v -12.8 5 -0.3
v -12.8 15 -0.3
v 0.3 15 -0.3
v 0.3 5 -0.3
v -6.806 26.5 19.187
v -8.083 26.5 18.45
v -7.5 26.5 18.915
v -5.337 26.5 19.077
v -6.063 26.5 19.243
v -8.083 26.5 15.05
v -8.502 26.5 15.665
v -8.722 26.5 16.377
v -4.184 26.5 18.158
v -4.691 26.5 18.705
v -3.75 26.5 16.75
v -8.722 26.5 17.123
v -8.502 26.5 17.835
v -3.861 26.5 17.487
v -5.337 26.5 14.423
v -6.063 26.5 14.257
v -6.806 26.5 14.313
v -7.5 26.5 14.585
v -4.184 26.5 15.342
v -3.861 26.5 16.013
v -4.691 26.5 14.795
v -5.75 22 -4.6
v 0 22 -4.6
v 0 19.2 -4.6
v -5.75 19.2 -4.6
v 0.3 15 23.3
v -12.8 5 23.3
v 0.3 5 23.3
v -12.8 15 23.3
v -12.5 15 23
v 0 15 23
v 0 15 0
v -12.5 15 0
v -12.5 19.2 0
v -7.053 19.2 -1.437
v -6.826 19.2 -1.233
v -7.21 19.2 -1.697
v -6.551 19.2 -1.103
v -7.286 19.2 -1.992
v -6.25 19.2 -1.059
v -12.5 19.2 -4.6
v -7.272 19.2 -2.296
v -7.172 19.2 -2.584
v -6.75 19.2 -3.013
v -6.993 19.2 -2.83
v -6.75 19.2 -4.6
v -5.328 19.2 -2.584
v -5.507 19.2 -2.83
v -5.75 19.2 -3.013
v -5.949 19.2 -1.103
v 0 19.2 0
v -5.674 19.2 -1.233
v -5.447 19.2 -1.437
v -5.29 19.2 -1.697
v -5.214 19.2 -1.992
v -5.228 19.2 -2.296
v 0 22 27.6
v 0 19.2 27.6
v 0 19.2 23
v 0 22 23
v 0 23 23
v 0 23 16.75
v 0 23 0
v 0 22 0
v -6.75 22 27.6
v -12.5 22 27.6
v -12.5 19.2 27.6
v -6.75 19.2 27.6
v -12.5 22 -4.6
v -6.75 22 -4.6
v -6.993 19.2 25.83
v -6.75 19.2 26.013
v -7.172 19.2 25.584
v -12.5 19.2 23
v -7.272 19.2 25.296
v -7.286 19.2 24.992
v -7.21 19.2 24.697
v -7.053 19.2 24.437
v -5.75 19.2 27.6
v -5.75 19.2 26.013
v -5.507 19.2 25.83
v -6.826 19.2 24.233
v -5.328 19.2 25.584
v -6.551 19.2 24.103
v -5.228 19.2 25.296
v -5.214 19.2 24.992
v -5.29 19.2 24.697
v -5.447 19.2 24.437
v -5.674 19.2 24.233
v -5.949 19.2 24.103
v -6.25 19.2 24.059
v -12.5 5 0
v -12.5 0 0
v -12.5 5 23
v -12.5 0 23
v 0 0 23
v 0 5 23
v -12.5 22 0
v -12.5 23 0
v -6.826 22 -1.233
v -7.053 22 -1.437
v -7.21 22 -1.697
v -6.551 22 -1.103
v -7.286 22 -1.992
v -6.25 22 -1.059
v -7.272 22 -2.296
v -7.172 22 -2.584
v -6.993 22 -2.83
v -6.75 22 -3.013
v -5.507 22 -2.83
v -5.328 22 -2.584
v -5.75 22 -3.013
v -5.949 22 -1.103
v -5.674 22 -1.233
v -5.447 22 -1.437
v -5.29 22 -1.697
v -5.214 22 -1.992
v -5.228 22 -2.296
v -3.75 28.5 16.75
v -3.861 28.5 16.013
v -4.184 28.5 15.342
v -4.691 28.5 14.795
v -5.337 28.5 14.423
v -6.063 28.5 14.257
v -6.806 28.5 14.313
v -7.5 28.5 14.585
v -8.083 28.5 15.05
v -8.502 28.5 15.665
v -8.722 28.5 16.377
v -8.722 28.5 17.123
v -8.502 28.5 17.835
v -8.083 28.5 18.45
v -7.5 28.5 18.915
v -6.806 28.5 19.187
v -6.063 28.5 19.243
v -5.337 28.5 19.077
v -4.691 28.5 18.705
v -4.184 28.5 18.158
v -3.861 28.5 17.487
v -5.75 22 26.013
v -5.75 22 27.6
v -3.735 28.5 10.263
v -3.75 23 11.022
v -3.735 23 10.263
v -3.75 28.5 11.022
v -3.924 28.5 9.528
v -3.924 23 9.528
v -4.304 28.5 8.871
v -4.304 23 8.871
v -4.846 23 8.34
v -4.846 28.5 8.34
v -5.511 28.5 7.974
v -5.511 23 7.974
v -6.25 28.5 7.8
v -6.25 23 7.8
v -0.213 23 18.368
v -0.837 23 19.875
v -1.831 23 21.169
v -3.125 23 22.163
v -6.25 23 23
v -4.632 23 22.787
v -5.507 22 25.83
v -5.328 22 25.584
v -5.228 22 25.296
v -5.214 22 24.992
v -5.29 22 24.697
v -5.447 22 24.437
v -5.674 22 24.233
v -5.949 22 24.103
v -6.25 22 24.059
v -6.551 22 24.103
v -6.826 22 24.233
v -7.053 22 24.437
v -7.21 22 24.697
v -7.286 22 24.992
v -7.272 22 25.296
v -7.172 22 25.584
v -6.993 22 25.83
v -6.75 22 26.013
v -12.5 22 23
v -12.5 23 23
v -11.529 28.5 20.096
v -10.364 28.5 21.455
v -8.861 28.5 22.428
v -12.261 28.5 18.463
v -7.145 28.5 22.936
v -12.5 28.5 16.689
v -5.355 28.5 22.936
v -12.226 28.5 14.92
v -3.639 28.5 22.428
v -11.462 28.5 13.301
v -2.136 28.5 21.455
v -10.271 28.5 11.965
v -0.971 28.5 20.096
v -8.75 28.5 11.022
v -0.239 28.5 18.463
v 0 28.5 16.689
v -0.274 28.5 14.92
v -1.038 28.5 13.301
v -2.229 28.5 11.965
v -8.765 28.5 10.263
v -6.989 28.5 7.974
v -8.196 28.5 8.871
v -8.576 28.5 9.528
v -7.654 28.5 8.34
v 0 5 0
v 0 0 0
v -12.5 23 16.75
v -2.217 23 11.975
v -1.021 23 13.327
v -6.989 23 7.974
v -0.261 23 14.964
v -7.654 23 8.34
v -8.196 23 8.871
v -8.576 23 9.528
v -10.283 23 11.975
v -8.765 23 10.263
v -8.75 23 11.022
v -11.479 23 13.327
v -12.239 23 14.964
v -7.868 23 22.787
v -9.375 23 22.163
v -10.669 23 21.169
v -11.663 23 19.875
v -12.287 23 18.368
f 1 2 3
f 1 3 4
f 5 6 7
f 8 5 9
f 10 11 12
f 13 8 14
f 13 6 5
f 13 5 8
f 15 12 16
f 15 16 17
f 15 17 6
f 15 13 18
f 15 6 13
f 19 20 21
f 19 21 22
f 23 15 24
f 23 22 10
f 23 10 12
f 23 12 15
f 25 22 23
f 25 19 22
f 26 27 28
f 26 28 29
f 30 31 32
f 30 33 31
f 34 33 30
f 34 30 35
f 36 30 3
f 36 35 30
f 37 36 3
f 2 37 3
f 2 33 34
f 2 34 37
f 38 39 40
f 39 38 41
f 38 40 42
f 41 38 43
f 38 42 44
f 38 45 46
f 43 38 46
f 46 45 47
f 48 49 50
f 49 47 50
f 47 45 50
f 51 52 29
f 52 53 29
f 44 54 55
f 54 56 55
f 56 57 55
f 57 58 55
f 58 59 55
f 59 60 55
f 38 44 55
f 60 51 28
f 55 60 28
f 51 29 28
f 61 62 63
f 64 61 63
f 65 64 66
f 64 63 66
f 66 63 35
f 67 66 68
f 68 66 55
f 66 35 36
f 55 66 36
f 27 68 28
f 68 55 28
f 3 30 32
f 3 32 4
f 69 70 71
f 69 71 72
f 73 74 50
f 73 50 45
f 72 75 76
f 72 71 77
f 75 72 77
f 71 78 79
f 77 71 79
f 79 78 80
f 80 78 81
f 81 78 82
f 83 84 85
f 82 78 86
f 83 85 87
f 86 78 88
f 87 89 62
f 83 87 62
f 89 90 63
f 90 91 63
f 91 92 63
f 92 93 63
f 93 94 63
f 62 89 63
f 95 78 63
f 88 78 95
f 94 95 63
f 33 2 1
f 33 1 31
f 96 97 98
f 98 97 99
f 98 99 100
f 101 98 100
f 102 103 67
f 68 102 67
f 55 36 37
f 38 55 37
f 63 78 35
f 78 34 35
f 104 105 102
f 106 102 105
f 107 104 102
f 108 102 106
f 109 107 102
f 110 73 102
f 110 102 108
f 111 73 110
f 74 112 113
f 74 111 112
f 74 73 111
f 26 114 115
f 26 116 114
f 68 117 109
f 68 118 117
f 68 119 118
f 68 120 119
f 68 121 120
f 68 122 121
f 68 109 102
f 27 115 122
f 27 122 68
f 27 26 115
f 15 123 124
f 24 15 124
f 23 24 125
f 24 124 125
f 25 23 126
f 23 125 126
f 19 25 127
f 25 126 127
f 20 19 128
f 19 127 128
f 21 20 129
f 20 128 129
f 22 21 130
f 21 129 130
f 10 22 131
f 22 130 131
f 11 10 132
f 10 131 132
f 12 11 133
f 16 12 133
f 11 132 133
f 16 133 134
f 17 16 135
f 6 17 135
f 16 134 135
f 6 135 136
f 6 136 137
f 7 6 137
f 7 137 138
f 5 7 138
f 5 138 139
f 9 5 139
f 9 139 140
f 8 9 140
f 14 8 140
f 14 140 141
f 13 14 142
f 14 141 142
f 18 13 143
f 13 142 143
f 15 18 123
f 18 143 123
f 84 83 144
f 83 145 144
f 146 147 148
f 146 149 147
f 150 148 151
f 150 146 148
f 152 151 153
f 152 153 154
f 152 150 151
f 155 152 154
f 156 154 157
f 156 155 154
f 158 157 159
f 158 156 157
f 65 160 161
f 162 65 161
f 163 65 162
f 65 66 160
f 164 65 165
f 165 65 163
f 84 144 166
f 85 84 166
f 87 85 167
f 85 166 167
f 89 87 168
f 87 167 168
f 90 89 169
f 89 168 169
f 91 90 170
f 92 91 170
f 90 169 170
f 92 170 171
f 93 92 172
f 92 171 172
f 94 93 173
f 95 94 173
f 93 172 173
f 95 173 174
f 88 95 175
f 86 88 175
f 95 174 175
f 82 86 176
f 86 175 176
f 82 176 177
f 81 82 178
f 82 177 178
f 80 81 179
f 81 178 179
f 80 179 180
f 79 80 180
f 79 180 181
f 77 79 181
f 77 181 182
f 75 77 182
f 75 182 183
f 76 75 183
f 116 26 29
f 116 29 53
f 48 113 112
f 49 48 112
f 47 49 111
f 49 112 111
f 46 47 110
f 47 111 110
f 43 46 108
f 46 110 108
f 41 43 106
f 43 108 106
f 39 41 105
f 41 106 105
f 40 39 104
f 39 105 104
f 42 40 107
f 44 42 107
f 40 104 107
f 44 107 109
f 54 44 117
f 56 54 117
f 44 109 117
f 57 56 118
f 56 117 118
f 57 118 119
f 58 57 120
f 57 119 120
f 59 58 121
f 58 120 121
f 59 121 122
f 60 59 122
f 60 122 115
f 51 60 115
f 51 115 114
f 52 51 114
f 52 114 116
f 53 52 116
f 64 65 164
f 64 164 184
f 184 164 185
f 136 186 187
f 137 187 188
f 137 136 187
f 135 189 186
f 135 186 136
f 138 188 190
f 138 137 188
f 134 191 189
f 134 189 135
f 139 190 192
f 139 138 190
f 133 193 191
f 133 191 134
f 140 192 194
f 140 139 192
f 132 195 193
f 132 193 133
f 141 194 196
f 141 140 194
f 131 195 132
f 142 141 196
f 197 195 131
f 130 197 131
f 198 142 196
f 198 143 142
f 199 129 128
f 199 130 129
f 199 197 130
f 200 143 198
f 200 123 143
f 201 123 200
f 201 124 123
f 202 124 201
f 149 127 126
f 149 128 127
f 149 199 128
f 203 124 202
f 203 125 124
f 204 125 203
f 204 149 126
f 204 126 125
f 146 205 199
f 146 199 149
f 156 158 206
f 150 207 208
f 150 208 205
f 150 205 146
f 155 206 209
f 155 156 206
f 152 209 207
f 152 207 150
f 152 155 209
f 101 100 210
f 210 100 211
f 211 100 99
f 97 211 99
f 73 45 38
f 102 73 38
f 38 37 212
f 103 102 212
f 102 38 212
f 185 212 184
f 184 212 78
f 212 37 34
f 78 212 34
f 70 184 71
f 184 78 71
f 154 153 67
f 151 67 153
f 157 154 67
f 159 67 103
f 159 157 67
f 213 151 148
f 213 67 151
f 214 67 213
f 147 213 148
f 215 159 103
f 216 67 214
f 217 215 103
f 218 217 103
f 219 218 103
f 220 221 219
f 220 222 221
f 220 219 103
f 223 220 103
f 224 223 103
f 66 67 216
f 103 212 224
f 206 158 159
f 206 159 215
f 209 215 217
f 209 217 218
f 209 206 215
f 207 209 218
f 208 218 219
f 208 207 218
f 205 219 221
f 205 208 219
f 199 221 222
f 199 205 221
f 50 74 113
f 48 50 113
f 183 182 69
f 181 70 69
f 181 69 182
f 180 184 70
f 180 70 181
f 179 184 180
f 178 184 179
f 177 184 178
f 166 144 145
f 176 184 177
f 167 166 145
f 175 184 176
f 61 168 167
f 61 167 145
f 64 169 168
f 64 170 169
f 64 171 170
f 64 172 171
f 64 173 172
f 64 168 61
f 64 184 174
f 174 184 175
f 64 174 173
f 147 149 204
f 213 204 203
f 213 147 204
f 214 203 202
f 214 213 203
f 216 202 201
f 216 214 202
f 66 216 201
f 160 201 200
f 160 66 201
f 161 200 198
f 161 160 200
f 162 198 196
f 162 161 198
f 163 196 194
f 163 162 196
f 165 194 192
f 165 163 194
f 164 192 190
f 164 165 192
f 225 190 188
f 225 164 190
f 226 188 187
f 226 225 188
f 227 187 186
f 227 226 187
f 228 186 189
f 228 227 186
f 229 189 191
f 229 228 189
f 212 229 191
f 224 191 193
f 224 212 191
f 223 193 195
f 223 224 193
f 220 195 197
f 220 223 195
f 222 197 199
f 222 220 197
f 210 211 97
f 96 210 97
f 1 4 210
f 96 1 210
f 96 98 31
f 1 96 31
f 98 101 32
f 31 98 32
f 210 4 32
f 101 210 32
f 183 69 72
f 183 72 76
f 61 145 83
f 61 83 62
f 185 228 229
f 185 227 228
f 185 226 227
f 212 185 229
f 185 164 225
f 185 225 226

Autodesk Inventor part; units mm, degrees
ref_plane "YZ Plane" through (0, 0, 0) normal (1, 0, 0) x (0, 1, 0)
ref_plane "XZ Plane" through (0, 0, 0) normal (0, 1, 0) x (-1, 0, 0)
ref_plane "XY Plane" through (0, 0, 0) normal (0, 0, 1) x (1, 0, 0)
sketch "Sketch1" plane through (0, 0, 0) normal (0, 1, 0) x (-1, 0, 0)
  line L0 (0, 0) -> (12.5, 0)
  line L1 (12.5, 0) -> (12.5, 23)
  line L2 (12.5, 23) -> (0, 23)
  line L3 (0, 23) -> (0, 0)
  dimension "d0" = 12.5
  dimension "d1" = 23
extrude "Extrusion1" add sketch "Sketch1" along normal blind 23
sketch "Sketch2" plane through (0, 23, 0) normal (0, 1, 0) x (1, 0, 0)
  line L0 (0, 0) -> (-12.5, 0) projected
  line L1 (-12.5, 0) -> (-12.5, -23) projected
  line L2 (-12.5, -23) -> (0, -23) projected
  line L3 (0, -23) -> (0, 0) projected
  line L4 (0, 4.6) -> (-12.5, 4.6)
  line L5 (-12.5, 4.6) -> (-12.5, -27.6)
  line L6 (-12.5, -27.6) -> (0, -27.6)
  line L7 (0, -27.6) -> (0, 4.6)
  line L8 (0, 4.6) -> (-12.5, -27.6) construction
  line L9 (-12.5, 4.6) -> (0, -27.6) construction
  point P0 (-6.25, -11.5)
  dimension "d4" = 32.2
extrude "Extrusion2" add sketch "Sketch2" against normal blind 3.8 contours L0 L5 L4 L7 | L7 L6 L5 L2
sketch "Sketch3" plane through (0, 23, 0) normal (0, 1, 0) x (1, 0, 0)
  line L0 (-12.5, 4.6) -> (-12.5, -27.6) projected
  line L1 (-12.5, -27.6) -> (0, -27.6) projected
  line L2 (0, -27.6) -> (0, 4.6) projected
  line L3 (0, 4.6) -> (-12.5, 4.6) projected
  line L4 (0, -23) -> (-12.5, -23) projected
  line L5 (-12.5, 0) -> (0, 0) projected
extrude "Extrusion3" cut sketch "Sketch3" against normal blind 1 contours L3 L2 L5 L0 | L4 L2 L1 L0
sketch "Sketch4" plane through (0, 23, 0) normal (0, 1, 0) x (1, 0, 0)
  line L0 (-12.5, -23) -> (0, -23) projected
  line L1 (-6.25, -23) -> (-6.25, -16.75)
  circle A0 centre (-6.25, -16.75) radius 6.25
  dimension "d9" = 6.25
extrude "Extrusion4" add sketch "Sketch4" along normal blind 5.5
sketch "Sketch5" plane through (-6.25, 28.5, 16.75) normal (0, 1, 0) x (1, 0, 0)
  circle A0 centre (0, 0) radius 6.25
  arc A1 (0, -8.95) -> (2.5, -5.72822) centre (-0.266089, -6.162672) ccw
  arc A2 (-2.5, -5.72822) -> (0, -8.95) centre (0.266089, -6.162672) ccw
  arc A3 (0, -8.95) -> (2.5, -5.72822) centre (-0.266089, -6.162672) ccw
  arc A4 (-2.5, -5.72822) -> (0, -8.95) centre (0.266089, -6.162672) ccw
  arc A5 (-2.5, -5.72822) -> (2.5, -5.72822) centre (0, 0) ccw
  line L0 (0, 0) -> (-2.287713, 0)
  arc A6 (2.5, 5.72822) -> (0, 8.95) centre (-0.266089, 6.162672) ccw
  arc A7 (0, 8.95) -> (-2.5, 5.72822) centre (0.266089, 6.162672) ccw
  arc A8 (2.5, 5.72822) -> (0, 8.95) centre (-0.266089, 6.162672) ccw
  arc A9 (0, 8.95) -> (-2.5, 5.72822) centre (0.266089, 6.162672) ccw
  arc A10 (2.5, 5.72822) -> (-2.5, 5.72822) centre (0, 0) ccw
  point P0 (6.25, 16.75)
  dimension "d14" = 2.8
extrude "Extrusion5" add sketch "Sketch5" against normal blind 7.5 contours A0 A7 A6
sketch "Sketch6" plane through (0, 28.5, 0) normal (0, 1, 0) x (1, 0, 0)
  arc A0 (-8.75, -11.02178) -> (-3.75, -11.02178) centre (-6.25, -16.75) ccw
  circle A1 centre (-6.25, -16.75) radius 3.475
  point P0 (0, 0)
  dimension "d17" = 6.95
extrude "Extrusion6" cut sketch "Sketch6" against normal blind 2
sketch "Sketch7" plane through (0, 28.5, 0) normal (0, 1, 0) x (1, 0, 0)
  circle A0 centre (-6.25, -16.75) radius 3.475
  arc A1 (-8.75, -11.02178) -> (-3.75, -11.02178) centre (-6.25, -16.75) ccw
  circle A2 centre (-6.25, -16.75) radius 3.5
  point P0 (0, 0)
  dimension "d20" = 7
sketch "Sketch7 outline for Extrusion7" plane through (0, 28.5, 0) normal (0, 1, 0) x (1, 0, 0)
  circle A0 centre (-6.25, -16.75) radius 3.475
extrude "Extrusion7" cut sketch "Sketch7 outline for Extrusion7" against normal blind 2
sketch "Sketch8" plane through (0, 22, 0) normal (0, 1, 0) x (1, 0, 0)
  line L0 (0, -27.6) -> (-12.5, -27.6)
  line L1 (0, -23) -> (0, -27.6)
  line L2 (-12.5, -23) -> (0, -23)
  line L3 (-12.5, -27.6) -> (-12.5, -23)
  line L4 (-12.5, 0) -> (-12.5, 4.6)
  line L5 (0, 0) -> (-12.5, 0)
  line L6 (0, 4.6) -> (0, 0)
  line L7 (-12.5, 4.6) -> (0, 4.6)
  arc A0 (-5.75, -26.013179) -> (-6.75, -26.013179) centre (-6.25, -25.1) ccw
  arc A1 (-6.75, -27.6) -> (-5.75, -27.6) centre (-6.25, -27.6) ccw
  line L8 (0, -27.6) -> (-12.5, -27.6)
  line L9 (-5.75, -27.6) -> (-5.75, -26.013179)
  line L10 (-6.75, -27.6) -> (-6.75, -26.013179)
  line L11 (0, -23) -> (0, 0)
  line L12 (0, -11.5) -> (-20.862921, -11.5)
  arc A2 (-6.75, 3.013179) -> (-5.75, 3.013179) centre (-6.25, 2.1) ccw
  arc A3 (-5.75, 4.6) -> (-6.75, 4.6) centre (-6.25, 4.6) ccw
  line L13 (-5.75, 4.6) -> (-5.75, 3.013179)
  line L14 (-6.75, 4.6) -> (-6.75, 3.013179)
extrude "Extrusion8" cut sketch "Sketch8" against normal blind 10 contours L0 L10 A0 L9 | A3 L7 | L7 L13 A2 L14
sketch "Sketch9" plane through (0, 28.5, 0) normal (0, 1, 0) x (1, 0, 0)
  circle A0 centre (-6.25, -16.75) radius 3.475
  arc A1 (-8.75, -11.02178) -> (-3.75, -11.02178) centre (-6.25, -16.75) ccw
  arc A2 (-3.75, -11.02178) -> (-6.25, -7.8) centre (-6.516089, -10.587328) ccw
  arc A3 (-6.25, -7.8) -> (-8.75, -11.02178) centre (-5.983911, -10.587328) ccw
  circle A4 centre (-6.25, -16.75) radius 2.5
  point P0 (0, 0)
  dimension "d29" = 5
extrude "Extrusion9" add sketch "Sketch9" against normal blind 10 contours A0
sketch "Sketch10" plane through (-12.5, 0, 0) normal (-1, 0, 0) x (0, 0, 1)
  line L0 (0, 23) -> (0, 22) projected
  line L1 (0, 22) -> (-4.6, 22) projected
  line L2 (-4.6, 22) -> (-4.6, 19.2) projected
  line L3 (0, 19.2) -> (-4.6, 19.2) projected
  line L4 (0, 0) -> (0, 19.2) projected
  line L5 (0, 0) -> (23, 0) projected
  line L6 (23, 0) -> (23, 19.2) projected
  line L7 (27.6, 19.2) -> (23, 19.2) projected
  line L8 (27.6, 22) -> (27.6, 19.2) projected
  line L9 (27.6, 22) -> (23, 22) projected
  line L10 (23, 22) -> (23, 23) projected
  line L11 (16.75, 23) -> (23, 23) projected
  line L12 (0, 23) -> (16.75, 23) projected
  line L13 (0, 0) -> (0, 5)
  line L14 (0, 0) -> (0, 19.2) projected
  line L15 (0, 5) -> (23, 5)
  line L16 (23, 0) -> (23, 19.2) projected
  line L17 (0, 5) -> (0, 15)
  line L18 (0, 15) -> (23, 15)
  dimension "d32" = 5
  dimension "d33" = 10
extrude "Extrusion11" add sketch "Sketch10" along normal blind 0.3 contours L18 L6 L15 L4
sketch "Sketch11" plane through (-12.5, 0, 23) normal (0, 0, 1) x (1, 0, 0)
  line L0 (12.5, 0) -> (12.5, 19.2) projected
  line L1 (-0.3, 5) -> (-0.3, 15) projected
  line L2 (-0.3, 15) -> (12.5, 15)
  line L3 (12.5, 15) -> (12.8, 15)
  line L4 (12.8, 15) -> (-0.3, 15)
  line L5 (-0.3, 15) -> (-0.3, 5)
  line L6 (-0.3, 5) -> (12.8, 5)
  line L7 (12.8, 5) -> (12.8, 15)
  point P0 (0, 15)
  dimension "d38" = 0.3
extrude "Extrusion12" add sketch "Sketch11" along normal blind 0.3
sketch "Sketch12" plane through (0, 0, 23) normal (1, 0, 0) x (0, 0, -1)
  line L0 (23, 22) -> (23, 23)
  line L1 (6.25, 23) -> (23, 23)
  line L2 (0, 23) -> (6.25, 23)
  line L3 (0, 23) -> (0, 22)
  line L4 (0, 22) -> (-4.6, 22)
  line L5 (-4.6, 22) -> (-4.6, 19.2)
  line L6 (0, 19.2) -> (-4.6, 19.2)
  line L7 (0, 15) -> (0, 19.2)
  line L8 (0, 5) -> (0, 15)
  line L9 (0, 0) -> (0, 5)
  line L10 (0, 0) -> (23, 0)
  line L11 (23, 0) -> (23, 19.2)
  line L12 (27.6, 19.2) -> (23, 19.2)
  line L13 (27.6, 22) -> (27.6, 19.2)
  line L14 (27.6, 22) -> (23, 22)
  line L15 (23, 0) -> (23, 19.2)
  line L16 (-0.411339, 5) -> (23, 5)
  line L17 (23, 5) -> (23.3, 5)
  line L18 (-0.3, 15) -> (23.3, 15)
  line L19 (23.3, 15) -> (23.3, 5)
  line L20 (23.3, 5) -> (-0.3, 5)
  line L21 (-0.3, 5) -> (-0.3, 15)
  dimension "d41" = 0.3
extrude "Extrusion13" add sketch "Sketch12" along normal blind 0.3 contours L18 L19 L17 L11 | L11 L16 L8 L18 | L8 L16 L21 L18
sketch "Sketch13" plane through (0, 0, 0) normal (0, 0, -1) x (-1, 0, 0)
  line L0 (-0.3, 5) -> (12.8, 5)
  line L1 (12.8, 5) -> (12.8, 15)
  line L2 (12.8, 15) -> (-0.3, 15)
  line L3 (-0.3, 15) -> (-0.3, 5)
  point P0 (0, 0)
extrude "Extrusion14" add sketch "Sketch13" along normal blind 0.3
properties part number "servo" material "LCP Plastic"
